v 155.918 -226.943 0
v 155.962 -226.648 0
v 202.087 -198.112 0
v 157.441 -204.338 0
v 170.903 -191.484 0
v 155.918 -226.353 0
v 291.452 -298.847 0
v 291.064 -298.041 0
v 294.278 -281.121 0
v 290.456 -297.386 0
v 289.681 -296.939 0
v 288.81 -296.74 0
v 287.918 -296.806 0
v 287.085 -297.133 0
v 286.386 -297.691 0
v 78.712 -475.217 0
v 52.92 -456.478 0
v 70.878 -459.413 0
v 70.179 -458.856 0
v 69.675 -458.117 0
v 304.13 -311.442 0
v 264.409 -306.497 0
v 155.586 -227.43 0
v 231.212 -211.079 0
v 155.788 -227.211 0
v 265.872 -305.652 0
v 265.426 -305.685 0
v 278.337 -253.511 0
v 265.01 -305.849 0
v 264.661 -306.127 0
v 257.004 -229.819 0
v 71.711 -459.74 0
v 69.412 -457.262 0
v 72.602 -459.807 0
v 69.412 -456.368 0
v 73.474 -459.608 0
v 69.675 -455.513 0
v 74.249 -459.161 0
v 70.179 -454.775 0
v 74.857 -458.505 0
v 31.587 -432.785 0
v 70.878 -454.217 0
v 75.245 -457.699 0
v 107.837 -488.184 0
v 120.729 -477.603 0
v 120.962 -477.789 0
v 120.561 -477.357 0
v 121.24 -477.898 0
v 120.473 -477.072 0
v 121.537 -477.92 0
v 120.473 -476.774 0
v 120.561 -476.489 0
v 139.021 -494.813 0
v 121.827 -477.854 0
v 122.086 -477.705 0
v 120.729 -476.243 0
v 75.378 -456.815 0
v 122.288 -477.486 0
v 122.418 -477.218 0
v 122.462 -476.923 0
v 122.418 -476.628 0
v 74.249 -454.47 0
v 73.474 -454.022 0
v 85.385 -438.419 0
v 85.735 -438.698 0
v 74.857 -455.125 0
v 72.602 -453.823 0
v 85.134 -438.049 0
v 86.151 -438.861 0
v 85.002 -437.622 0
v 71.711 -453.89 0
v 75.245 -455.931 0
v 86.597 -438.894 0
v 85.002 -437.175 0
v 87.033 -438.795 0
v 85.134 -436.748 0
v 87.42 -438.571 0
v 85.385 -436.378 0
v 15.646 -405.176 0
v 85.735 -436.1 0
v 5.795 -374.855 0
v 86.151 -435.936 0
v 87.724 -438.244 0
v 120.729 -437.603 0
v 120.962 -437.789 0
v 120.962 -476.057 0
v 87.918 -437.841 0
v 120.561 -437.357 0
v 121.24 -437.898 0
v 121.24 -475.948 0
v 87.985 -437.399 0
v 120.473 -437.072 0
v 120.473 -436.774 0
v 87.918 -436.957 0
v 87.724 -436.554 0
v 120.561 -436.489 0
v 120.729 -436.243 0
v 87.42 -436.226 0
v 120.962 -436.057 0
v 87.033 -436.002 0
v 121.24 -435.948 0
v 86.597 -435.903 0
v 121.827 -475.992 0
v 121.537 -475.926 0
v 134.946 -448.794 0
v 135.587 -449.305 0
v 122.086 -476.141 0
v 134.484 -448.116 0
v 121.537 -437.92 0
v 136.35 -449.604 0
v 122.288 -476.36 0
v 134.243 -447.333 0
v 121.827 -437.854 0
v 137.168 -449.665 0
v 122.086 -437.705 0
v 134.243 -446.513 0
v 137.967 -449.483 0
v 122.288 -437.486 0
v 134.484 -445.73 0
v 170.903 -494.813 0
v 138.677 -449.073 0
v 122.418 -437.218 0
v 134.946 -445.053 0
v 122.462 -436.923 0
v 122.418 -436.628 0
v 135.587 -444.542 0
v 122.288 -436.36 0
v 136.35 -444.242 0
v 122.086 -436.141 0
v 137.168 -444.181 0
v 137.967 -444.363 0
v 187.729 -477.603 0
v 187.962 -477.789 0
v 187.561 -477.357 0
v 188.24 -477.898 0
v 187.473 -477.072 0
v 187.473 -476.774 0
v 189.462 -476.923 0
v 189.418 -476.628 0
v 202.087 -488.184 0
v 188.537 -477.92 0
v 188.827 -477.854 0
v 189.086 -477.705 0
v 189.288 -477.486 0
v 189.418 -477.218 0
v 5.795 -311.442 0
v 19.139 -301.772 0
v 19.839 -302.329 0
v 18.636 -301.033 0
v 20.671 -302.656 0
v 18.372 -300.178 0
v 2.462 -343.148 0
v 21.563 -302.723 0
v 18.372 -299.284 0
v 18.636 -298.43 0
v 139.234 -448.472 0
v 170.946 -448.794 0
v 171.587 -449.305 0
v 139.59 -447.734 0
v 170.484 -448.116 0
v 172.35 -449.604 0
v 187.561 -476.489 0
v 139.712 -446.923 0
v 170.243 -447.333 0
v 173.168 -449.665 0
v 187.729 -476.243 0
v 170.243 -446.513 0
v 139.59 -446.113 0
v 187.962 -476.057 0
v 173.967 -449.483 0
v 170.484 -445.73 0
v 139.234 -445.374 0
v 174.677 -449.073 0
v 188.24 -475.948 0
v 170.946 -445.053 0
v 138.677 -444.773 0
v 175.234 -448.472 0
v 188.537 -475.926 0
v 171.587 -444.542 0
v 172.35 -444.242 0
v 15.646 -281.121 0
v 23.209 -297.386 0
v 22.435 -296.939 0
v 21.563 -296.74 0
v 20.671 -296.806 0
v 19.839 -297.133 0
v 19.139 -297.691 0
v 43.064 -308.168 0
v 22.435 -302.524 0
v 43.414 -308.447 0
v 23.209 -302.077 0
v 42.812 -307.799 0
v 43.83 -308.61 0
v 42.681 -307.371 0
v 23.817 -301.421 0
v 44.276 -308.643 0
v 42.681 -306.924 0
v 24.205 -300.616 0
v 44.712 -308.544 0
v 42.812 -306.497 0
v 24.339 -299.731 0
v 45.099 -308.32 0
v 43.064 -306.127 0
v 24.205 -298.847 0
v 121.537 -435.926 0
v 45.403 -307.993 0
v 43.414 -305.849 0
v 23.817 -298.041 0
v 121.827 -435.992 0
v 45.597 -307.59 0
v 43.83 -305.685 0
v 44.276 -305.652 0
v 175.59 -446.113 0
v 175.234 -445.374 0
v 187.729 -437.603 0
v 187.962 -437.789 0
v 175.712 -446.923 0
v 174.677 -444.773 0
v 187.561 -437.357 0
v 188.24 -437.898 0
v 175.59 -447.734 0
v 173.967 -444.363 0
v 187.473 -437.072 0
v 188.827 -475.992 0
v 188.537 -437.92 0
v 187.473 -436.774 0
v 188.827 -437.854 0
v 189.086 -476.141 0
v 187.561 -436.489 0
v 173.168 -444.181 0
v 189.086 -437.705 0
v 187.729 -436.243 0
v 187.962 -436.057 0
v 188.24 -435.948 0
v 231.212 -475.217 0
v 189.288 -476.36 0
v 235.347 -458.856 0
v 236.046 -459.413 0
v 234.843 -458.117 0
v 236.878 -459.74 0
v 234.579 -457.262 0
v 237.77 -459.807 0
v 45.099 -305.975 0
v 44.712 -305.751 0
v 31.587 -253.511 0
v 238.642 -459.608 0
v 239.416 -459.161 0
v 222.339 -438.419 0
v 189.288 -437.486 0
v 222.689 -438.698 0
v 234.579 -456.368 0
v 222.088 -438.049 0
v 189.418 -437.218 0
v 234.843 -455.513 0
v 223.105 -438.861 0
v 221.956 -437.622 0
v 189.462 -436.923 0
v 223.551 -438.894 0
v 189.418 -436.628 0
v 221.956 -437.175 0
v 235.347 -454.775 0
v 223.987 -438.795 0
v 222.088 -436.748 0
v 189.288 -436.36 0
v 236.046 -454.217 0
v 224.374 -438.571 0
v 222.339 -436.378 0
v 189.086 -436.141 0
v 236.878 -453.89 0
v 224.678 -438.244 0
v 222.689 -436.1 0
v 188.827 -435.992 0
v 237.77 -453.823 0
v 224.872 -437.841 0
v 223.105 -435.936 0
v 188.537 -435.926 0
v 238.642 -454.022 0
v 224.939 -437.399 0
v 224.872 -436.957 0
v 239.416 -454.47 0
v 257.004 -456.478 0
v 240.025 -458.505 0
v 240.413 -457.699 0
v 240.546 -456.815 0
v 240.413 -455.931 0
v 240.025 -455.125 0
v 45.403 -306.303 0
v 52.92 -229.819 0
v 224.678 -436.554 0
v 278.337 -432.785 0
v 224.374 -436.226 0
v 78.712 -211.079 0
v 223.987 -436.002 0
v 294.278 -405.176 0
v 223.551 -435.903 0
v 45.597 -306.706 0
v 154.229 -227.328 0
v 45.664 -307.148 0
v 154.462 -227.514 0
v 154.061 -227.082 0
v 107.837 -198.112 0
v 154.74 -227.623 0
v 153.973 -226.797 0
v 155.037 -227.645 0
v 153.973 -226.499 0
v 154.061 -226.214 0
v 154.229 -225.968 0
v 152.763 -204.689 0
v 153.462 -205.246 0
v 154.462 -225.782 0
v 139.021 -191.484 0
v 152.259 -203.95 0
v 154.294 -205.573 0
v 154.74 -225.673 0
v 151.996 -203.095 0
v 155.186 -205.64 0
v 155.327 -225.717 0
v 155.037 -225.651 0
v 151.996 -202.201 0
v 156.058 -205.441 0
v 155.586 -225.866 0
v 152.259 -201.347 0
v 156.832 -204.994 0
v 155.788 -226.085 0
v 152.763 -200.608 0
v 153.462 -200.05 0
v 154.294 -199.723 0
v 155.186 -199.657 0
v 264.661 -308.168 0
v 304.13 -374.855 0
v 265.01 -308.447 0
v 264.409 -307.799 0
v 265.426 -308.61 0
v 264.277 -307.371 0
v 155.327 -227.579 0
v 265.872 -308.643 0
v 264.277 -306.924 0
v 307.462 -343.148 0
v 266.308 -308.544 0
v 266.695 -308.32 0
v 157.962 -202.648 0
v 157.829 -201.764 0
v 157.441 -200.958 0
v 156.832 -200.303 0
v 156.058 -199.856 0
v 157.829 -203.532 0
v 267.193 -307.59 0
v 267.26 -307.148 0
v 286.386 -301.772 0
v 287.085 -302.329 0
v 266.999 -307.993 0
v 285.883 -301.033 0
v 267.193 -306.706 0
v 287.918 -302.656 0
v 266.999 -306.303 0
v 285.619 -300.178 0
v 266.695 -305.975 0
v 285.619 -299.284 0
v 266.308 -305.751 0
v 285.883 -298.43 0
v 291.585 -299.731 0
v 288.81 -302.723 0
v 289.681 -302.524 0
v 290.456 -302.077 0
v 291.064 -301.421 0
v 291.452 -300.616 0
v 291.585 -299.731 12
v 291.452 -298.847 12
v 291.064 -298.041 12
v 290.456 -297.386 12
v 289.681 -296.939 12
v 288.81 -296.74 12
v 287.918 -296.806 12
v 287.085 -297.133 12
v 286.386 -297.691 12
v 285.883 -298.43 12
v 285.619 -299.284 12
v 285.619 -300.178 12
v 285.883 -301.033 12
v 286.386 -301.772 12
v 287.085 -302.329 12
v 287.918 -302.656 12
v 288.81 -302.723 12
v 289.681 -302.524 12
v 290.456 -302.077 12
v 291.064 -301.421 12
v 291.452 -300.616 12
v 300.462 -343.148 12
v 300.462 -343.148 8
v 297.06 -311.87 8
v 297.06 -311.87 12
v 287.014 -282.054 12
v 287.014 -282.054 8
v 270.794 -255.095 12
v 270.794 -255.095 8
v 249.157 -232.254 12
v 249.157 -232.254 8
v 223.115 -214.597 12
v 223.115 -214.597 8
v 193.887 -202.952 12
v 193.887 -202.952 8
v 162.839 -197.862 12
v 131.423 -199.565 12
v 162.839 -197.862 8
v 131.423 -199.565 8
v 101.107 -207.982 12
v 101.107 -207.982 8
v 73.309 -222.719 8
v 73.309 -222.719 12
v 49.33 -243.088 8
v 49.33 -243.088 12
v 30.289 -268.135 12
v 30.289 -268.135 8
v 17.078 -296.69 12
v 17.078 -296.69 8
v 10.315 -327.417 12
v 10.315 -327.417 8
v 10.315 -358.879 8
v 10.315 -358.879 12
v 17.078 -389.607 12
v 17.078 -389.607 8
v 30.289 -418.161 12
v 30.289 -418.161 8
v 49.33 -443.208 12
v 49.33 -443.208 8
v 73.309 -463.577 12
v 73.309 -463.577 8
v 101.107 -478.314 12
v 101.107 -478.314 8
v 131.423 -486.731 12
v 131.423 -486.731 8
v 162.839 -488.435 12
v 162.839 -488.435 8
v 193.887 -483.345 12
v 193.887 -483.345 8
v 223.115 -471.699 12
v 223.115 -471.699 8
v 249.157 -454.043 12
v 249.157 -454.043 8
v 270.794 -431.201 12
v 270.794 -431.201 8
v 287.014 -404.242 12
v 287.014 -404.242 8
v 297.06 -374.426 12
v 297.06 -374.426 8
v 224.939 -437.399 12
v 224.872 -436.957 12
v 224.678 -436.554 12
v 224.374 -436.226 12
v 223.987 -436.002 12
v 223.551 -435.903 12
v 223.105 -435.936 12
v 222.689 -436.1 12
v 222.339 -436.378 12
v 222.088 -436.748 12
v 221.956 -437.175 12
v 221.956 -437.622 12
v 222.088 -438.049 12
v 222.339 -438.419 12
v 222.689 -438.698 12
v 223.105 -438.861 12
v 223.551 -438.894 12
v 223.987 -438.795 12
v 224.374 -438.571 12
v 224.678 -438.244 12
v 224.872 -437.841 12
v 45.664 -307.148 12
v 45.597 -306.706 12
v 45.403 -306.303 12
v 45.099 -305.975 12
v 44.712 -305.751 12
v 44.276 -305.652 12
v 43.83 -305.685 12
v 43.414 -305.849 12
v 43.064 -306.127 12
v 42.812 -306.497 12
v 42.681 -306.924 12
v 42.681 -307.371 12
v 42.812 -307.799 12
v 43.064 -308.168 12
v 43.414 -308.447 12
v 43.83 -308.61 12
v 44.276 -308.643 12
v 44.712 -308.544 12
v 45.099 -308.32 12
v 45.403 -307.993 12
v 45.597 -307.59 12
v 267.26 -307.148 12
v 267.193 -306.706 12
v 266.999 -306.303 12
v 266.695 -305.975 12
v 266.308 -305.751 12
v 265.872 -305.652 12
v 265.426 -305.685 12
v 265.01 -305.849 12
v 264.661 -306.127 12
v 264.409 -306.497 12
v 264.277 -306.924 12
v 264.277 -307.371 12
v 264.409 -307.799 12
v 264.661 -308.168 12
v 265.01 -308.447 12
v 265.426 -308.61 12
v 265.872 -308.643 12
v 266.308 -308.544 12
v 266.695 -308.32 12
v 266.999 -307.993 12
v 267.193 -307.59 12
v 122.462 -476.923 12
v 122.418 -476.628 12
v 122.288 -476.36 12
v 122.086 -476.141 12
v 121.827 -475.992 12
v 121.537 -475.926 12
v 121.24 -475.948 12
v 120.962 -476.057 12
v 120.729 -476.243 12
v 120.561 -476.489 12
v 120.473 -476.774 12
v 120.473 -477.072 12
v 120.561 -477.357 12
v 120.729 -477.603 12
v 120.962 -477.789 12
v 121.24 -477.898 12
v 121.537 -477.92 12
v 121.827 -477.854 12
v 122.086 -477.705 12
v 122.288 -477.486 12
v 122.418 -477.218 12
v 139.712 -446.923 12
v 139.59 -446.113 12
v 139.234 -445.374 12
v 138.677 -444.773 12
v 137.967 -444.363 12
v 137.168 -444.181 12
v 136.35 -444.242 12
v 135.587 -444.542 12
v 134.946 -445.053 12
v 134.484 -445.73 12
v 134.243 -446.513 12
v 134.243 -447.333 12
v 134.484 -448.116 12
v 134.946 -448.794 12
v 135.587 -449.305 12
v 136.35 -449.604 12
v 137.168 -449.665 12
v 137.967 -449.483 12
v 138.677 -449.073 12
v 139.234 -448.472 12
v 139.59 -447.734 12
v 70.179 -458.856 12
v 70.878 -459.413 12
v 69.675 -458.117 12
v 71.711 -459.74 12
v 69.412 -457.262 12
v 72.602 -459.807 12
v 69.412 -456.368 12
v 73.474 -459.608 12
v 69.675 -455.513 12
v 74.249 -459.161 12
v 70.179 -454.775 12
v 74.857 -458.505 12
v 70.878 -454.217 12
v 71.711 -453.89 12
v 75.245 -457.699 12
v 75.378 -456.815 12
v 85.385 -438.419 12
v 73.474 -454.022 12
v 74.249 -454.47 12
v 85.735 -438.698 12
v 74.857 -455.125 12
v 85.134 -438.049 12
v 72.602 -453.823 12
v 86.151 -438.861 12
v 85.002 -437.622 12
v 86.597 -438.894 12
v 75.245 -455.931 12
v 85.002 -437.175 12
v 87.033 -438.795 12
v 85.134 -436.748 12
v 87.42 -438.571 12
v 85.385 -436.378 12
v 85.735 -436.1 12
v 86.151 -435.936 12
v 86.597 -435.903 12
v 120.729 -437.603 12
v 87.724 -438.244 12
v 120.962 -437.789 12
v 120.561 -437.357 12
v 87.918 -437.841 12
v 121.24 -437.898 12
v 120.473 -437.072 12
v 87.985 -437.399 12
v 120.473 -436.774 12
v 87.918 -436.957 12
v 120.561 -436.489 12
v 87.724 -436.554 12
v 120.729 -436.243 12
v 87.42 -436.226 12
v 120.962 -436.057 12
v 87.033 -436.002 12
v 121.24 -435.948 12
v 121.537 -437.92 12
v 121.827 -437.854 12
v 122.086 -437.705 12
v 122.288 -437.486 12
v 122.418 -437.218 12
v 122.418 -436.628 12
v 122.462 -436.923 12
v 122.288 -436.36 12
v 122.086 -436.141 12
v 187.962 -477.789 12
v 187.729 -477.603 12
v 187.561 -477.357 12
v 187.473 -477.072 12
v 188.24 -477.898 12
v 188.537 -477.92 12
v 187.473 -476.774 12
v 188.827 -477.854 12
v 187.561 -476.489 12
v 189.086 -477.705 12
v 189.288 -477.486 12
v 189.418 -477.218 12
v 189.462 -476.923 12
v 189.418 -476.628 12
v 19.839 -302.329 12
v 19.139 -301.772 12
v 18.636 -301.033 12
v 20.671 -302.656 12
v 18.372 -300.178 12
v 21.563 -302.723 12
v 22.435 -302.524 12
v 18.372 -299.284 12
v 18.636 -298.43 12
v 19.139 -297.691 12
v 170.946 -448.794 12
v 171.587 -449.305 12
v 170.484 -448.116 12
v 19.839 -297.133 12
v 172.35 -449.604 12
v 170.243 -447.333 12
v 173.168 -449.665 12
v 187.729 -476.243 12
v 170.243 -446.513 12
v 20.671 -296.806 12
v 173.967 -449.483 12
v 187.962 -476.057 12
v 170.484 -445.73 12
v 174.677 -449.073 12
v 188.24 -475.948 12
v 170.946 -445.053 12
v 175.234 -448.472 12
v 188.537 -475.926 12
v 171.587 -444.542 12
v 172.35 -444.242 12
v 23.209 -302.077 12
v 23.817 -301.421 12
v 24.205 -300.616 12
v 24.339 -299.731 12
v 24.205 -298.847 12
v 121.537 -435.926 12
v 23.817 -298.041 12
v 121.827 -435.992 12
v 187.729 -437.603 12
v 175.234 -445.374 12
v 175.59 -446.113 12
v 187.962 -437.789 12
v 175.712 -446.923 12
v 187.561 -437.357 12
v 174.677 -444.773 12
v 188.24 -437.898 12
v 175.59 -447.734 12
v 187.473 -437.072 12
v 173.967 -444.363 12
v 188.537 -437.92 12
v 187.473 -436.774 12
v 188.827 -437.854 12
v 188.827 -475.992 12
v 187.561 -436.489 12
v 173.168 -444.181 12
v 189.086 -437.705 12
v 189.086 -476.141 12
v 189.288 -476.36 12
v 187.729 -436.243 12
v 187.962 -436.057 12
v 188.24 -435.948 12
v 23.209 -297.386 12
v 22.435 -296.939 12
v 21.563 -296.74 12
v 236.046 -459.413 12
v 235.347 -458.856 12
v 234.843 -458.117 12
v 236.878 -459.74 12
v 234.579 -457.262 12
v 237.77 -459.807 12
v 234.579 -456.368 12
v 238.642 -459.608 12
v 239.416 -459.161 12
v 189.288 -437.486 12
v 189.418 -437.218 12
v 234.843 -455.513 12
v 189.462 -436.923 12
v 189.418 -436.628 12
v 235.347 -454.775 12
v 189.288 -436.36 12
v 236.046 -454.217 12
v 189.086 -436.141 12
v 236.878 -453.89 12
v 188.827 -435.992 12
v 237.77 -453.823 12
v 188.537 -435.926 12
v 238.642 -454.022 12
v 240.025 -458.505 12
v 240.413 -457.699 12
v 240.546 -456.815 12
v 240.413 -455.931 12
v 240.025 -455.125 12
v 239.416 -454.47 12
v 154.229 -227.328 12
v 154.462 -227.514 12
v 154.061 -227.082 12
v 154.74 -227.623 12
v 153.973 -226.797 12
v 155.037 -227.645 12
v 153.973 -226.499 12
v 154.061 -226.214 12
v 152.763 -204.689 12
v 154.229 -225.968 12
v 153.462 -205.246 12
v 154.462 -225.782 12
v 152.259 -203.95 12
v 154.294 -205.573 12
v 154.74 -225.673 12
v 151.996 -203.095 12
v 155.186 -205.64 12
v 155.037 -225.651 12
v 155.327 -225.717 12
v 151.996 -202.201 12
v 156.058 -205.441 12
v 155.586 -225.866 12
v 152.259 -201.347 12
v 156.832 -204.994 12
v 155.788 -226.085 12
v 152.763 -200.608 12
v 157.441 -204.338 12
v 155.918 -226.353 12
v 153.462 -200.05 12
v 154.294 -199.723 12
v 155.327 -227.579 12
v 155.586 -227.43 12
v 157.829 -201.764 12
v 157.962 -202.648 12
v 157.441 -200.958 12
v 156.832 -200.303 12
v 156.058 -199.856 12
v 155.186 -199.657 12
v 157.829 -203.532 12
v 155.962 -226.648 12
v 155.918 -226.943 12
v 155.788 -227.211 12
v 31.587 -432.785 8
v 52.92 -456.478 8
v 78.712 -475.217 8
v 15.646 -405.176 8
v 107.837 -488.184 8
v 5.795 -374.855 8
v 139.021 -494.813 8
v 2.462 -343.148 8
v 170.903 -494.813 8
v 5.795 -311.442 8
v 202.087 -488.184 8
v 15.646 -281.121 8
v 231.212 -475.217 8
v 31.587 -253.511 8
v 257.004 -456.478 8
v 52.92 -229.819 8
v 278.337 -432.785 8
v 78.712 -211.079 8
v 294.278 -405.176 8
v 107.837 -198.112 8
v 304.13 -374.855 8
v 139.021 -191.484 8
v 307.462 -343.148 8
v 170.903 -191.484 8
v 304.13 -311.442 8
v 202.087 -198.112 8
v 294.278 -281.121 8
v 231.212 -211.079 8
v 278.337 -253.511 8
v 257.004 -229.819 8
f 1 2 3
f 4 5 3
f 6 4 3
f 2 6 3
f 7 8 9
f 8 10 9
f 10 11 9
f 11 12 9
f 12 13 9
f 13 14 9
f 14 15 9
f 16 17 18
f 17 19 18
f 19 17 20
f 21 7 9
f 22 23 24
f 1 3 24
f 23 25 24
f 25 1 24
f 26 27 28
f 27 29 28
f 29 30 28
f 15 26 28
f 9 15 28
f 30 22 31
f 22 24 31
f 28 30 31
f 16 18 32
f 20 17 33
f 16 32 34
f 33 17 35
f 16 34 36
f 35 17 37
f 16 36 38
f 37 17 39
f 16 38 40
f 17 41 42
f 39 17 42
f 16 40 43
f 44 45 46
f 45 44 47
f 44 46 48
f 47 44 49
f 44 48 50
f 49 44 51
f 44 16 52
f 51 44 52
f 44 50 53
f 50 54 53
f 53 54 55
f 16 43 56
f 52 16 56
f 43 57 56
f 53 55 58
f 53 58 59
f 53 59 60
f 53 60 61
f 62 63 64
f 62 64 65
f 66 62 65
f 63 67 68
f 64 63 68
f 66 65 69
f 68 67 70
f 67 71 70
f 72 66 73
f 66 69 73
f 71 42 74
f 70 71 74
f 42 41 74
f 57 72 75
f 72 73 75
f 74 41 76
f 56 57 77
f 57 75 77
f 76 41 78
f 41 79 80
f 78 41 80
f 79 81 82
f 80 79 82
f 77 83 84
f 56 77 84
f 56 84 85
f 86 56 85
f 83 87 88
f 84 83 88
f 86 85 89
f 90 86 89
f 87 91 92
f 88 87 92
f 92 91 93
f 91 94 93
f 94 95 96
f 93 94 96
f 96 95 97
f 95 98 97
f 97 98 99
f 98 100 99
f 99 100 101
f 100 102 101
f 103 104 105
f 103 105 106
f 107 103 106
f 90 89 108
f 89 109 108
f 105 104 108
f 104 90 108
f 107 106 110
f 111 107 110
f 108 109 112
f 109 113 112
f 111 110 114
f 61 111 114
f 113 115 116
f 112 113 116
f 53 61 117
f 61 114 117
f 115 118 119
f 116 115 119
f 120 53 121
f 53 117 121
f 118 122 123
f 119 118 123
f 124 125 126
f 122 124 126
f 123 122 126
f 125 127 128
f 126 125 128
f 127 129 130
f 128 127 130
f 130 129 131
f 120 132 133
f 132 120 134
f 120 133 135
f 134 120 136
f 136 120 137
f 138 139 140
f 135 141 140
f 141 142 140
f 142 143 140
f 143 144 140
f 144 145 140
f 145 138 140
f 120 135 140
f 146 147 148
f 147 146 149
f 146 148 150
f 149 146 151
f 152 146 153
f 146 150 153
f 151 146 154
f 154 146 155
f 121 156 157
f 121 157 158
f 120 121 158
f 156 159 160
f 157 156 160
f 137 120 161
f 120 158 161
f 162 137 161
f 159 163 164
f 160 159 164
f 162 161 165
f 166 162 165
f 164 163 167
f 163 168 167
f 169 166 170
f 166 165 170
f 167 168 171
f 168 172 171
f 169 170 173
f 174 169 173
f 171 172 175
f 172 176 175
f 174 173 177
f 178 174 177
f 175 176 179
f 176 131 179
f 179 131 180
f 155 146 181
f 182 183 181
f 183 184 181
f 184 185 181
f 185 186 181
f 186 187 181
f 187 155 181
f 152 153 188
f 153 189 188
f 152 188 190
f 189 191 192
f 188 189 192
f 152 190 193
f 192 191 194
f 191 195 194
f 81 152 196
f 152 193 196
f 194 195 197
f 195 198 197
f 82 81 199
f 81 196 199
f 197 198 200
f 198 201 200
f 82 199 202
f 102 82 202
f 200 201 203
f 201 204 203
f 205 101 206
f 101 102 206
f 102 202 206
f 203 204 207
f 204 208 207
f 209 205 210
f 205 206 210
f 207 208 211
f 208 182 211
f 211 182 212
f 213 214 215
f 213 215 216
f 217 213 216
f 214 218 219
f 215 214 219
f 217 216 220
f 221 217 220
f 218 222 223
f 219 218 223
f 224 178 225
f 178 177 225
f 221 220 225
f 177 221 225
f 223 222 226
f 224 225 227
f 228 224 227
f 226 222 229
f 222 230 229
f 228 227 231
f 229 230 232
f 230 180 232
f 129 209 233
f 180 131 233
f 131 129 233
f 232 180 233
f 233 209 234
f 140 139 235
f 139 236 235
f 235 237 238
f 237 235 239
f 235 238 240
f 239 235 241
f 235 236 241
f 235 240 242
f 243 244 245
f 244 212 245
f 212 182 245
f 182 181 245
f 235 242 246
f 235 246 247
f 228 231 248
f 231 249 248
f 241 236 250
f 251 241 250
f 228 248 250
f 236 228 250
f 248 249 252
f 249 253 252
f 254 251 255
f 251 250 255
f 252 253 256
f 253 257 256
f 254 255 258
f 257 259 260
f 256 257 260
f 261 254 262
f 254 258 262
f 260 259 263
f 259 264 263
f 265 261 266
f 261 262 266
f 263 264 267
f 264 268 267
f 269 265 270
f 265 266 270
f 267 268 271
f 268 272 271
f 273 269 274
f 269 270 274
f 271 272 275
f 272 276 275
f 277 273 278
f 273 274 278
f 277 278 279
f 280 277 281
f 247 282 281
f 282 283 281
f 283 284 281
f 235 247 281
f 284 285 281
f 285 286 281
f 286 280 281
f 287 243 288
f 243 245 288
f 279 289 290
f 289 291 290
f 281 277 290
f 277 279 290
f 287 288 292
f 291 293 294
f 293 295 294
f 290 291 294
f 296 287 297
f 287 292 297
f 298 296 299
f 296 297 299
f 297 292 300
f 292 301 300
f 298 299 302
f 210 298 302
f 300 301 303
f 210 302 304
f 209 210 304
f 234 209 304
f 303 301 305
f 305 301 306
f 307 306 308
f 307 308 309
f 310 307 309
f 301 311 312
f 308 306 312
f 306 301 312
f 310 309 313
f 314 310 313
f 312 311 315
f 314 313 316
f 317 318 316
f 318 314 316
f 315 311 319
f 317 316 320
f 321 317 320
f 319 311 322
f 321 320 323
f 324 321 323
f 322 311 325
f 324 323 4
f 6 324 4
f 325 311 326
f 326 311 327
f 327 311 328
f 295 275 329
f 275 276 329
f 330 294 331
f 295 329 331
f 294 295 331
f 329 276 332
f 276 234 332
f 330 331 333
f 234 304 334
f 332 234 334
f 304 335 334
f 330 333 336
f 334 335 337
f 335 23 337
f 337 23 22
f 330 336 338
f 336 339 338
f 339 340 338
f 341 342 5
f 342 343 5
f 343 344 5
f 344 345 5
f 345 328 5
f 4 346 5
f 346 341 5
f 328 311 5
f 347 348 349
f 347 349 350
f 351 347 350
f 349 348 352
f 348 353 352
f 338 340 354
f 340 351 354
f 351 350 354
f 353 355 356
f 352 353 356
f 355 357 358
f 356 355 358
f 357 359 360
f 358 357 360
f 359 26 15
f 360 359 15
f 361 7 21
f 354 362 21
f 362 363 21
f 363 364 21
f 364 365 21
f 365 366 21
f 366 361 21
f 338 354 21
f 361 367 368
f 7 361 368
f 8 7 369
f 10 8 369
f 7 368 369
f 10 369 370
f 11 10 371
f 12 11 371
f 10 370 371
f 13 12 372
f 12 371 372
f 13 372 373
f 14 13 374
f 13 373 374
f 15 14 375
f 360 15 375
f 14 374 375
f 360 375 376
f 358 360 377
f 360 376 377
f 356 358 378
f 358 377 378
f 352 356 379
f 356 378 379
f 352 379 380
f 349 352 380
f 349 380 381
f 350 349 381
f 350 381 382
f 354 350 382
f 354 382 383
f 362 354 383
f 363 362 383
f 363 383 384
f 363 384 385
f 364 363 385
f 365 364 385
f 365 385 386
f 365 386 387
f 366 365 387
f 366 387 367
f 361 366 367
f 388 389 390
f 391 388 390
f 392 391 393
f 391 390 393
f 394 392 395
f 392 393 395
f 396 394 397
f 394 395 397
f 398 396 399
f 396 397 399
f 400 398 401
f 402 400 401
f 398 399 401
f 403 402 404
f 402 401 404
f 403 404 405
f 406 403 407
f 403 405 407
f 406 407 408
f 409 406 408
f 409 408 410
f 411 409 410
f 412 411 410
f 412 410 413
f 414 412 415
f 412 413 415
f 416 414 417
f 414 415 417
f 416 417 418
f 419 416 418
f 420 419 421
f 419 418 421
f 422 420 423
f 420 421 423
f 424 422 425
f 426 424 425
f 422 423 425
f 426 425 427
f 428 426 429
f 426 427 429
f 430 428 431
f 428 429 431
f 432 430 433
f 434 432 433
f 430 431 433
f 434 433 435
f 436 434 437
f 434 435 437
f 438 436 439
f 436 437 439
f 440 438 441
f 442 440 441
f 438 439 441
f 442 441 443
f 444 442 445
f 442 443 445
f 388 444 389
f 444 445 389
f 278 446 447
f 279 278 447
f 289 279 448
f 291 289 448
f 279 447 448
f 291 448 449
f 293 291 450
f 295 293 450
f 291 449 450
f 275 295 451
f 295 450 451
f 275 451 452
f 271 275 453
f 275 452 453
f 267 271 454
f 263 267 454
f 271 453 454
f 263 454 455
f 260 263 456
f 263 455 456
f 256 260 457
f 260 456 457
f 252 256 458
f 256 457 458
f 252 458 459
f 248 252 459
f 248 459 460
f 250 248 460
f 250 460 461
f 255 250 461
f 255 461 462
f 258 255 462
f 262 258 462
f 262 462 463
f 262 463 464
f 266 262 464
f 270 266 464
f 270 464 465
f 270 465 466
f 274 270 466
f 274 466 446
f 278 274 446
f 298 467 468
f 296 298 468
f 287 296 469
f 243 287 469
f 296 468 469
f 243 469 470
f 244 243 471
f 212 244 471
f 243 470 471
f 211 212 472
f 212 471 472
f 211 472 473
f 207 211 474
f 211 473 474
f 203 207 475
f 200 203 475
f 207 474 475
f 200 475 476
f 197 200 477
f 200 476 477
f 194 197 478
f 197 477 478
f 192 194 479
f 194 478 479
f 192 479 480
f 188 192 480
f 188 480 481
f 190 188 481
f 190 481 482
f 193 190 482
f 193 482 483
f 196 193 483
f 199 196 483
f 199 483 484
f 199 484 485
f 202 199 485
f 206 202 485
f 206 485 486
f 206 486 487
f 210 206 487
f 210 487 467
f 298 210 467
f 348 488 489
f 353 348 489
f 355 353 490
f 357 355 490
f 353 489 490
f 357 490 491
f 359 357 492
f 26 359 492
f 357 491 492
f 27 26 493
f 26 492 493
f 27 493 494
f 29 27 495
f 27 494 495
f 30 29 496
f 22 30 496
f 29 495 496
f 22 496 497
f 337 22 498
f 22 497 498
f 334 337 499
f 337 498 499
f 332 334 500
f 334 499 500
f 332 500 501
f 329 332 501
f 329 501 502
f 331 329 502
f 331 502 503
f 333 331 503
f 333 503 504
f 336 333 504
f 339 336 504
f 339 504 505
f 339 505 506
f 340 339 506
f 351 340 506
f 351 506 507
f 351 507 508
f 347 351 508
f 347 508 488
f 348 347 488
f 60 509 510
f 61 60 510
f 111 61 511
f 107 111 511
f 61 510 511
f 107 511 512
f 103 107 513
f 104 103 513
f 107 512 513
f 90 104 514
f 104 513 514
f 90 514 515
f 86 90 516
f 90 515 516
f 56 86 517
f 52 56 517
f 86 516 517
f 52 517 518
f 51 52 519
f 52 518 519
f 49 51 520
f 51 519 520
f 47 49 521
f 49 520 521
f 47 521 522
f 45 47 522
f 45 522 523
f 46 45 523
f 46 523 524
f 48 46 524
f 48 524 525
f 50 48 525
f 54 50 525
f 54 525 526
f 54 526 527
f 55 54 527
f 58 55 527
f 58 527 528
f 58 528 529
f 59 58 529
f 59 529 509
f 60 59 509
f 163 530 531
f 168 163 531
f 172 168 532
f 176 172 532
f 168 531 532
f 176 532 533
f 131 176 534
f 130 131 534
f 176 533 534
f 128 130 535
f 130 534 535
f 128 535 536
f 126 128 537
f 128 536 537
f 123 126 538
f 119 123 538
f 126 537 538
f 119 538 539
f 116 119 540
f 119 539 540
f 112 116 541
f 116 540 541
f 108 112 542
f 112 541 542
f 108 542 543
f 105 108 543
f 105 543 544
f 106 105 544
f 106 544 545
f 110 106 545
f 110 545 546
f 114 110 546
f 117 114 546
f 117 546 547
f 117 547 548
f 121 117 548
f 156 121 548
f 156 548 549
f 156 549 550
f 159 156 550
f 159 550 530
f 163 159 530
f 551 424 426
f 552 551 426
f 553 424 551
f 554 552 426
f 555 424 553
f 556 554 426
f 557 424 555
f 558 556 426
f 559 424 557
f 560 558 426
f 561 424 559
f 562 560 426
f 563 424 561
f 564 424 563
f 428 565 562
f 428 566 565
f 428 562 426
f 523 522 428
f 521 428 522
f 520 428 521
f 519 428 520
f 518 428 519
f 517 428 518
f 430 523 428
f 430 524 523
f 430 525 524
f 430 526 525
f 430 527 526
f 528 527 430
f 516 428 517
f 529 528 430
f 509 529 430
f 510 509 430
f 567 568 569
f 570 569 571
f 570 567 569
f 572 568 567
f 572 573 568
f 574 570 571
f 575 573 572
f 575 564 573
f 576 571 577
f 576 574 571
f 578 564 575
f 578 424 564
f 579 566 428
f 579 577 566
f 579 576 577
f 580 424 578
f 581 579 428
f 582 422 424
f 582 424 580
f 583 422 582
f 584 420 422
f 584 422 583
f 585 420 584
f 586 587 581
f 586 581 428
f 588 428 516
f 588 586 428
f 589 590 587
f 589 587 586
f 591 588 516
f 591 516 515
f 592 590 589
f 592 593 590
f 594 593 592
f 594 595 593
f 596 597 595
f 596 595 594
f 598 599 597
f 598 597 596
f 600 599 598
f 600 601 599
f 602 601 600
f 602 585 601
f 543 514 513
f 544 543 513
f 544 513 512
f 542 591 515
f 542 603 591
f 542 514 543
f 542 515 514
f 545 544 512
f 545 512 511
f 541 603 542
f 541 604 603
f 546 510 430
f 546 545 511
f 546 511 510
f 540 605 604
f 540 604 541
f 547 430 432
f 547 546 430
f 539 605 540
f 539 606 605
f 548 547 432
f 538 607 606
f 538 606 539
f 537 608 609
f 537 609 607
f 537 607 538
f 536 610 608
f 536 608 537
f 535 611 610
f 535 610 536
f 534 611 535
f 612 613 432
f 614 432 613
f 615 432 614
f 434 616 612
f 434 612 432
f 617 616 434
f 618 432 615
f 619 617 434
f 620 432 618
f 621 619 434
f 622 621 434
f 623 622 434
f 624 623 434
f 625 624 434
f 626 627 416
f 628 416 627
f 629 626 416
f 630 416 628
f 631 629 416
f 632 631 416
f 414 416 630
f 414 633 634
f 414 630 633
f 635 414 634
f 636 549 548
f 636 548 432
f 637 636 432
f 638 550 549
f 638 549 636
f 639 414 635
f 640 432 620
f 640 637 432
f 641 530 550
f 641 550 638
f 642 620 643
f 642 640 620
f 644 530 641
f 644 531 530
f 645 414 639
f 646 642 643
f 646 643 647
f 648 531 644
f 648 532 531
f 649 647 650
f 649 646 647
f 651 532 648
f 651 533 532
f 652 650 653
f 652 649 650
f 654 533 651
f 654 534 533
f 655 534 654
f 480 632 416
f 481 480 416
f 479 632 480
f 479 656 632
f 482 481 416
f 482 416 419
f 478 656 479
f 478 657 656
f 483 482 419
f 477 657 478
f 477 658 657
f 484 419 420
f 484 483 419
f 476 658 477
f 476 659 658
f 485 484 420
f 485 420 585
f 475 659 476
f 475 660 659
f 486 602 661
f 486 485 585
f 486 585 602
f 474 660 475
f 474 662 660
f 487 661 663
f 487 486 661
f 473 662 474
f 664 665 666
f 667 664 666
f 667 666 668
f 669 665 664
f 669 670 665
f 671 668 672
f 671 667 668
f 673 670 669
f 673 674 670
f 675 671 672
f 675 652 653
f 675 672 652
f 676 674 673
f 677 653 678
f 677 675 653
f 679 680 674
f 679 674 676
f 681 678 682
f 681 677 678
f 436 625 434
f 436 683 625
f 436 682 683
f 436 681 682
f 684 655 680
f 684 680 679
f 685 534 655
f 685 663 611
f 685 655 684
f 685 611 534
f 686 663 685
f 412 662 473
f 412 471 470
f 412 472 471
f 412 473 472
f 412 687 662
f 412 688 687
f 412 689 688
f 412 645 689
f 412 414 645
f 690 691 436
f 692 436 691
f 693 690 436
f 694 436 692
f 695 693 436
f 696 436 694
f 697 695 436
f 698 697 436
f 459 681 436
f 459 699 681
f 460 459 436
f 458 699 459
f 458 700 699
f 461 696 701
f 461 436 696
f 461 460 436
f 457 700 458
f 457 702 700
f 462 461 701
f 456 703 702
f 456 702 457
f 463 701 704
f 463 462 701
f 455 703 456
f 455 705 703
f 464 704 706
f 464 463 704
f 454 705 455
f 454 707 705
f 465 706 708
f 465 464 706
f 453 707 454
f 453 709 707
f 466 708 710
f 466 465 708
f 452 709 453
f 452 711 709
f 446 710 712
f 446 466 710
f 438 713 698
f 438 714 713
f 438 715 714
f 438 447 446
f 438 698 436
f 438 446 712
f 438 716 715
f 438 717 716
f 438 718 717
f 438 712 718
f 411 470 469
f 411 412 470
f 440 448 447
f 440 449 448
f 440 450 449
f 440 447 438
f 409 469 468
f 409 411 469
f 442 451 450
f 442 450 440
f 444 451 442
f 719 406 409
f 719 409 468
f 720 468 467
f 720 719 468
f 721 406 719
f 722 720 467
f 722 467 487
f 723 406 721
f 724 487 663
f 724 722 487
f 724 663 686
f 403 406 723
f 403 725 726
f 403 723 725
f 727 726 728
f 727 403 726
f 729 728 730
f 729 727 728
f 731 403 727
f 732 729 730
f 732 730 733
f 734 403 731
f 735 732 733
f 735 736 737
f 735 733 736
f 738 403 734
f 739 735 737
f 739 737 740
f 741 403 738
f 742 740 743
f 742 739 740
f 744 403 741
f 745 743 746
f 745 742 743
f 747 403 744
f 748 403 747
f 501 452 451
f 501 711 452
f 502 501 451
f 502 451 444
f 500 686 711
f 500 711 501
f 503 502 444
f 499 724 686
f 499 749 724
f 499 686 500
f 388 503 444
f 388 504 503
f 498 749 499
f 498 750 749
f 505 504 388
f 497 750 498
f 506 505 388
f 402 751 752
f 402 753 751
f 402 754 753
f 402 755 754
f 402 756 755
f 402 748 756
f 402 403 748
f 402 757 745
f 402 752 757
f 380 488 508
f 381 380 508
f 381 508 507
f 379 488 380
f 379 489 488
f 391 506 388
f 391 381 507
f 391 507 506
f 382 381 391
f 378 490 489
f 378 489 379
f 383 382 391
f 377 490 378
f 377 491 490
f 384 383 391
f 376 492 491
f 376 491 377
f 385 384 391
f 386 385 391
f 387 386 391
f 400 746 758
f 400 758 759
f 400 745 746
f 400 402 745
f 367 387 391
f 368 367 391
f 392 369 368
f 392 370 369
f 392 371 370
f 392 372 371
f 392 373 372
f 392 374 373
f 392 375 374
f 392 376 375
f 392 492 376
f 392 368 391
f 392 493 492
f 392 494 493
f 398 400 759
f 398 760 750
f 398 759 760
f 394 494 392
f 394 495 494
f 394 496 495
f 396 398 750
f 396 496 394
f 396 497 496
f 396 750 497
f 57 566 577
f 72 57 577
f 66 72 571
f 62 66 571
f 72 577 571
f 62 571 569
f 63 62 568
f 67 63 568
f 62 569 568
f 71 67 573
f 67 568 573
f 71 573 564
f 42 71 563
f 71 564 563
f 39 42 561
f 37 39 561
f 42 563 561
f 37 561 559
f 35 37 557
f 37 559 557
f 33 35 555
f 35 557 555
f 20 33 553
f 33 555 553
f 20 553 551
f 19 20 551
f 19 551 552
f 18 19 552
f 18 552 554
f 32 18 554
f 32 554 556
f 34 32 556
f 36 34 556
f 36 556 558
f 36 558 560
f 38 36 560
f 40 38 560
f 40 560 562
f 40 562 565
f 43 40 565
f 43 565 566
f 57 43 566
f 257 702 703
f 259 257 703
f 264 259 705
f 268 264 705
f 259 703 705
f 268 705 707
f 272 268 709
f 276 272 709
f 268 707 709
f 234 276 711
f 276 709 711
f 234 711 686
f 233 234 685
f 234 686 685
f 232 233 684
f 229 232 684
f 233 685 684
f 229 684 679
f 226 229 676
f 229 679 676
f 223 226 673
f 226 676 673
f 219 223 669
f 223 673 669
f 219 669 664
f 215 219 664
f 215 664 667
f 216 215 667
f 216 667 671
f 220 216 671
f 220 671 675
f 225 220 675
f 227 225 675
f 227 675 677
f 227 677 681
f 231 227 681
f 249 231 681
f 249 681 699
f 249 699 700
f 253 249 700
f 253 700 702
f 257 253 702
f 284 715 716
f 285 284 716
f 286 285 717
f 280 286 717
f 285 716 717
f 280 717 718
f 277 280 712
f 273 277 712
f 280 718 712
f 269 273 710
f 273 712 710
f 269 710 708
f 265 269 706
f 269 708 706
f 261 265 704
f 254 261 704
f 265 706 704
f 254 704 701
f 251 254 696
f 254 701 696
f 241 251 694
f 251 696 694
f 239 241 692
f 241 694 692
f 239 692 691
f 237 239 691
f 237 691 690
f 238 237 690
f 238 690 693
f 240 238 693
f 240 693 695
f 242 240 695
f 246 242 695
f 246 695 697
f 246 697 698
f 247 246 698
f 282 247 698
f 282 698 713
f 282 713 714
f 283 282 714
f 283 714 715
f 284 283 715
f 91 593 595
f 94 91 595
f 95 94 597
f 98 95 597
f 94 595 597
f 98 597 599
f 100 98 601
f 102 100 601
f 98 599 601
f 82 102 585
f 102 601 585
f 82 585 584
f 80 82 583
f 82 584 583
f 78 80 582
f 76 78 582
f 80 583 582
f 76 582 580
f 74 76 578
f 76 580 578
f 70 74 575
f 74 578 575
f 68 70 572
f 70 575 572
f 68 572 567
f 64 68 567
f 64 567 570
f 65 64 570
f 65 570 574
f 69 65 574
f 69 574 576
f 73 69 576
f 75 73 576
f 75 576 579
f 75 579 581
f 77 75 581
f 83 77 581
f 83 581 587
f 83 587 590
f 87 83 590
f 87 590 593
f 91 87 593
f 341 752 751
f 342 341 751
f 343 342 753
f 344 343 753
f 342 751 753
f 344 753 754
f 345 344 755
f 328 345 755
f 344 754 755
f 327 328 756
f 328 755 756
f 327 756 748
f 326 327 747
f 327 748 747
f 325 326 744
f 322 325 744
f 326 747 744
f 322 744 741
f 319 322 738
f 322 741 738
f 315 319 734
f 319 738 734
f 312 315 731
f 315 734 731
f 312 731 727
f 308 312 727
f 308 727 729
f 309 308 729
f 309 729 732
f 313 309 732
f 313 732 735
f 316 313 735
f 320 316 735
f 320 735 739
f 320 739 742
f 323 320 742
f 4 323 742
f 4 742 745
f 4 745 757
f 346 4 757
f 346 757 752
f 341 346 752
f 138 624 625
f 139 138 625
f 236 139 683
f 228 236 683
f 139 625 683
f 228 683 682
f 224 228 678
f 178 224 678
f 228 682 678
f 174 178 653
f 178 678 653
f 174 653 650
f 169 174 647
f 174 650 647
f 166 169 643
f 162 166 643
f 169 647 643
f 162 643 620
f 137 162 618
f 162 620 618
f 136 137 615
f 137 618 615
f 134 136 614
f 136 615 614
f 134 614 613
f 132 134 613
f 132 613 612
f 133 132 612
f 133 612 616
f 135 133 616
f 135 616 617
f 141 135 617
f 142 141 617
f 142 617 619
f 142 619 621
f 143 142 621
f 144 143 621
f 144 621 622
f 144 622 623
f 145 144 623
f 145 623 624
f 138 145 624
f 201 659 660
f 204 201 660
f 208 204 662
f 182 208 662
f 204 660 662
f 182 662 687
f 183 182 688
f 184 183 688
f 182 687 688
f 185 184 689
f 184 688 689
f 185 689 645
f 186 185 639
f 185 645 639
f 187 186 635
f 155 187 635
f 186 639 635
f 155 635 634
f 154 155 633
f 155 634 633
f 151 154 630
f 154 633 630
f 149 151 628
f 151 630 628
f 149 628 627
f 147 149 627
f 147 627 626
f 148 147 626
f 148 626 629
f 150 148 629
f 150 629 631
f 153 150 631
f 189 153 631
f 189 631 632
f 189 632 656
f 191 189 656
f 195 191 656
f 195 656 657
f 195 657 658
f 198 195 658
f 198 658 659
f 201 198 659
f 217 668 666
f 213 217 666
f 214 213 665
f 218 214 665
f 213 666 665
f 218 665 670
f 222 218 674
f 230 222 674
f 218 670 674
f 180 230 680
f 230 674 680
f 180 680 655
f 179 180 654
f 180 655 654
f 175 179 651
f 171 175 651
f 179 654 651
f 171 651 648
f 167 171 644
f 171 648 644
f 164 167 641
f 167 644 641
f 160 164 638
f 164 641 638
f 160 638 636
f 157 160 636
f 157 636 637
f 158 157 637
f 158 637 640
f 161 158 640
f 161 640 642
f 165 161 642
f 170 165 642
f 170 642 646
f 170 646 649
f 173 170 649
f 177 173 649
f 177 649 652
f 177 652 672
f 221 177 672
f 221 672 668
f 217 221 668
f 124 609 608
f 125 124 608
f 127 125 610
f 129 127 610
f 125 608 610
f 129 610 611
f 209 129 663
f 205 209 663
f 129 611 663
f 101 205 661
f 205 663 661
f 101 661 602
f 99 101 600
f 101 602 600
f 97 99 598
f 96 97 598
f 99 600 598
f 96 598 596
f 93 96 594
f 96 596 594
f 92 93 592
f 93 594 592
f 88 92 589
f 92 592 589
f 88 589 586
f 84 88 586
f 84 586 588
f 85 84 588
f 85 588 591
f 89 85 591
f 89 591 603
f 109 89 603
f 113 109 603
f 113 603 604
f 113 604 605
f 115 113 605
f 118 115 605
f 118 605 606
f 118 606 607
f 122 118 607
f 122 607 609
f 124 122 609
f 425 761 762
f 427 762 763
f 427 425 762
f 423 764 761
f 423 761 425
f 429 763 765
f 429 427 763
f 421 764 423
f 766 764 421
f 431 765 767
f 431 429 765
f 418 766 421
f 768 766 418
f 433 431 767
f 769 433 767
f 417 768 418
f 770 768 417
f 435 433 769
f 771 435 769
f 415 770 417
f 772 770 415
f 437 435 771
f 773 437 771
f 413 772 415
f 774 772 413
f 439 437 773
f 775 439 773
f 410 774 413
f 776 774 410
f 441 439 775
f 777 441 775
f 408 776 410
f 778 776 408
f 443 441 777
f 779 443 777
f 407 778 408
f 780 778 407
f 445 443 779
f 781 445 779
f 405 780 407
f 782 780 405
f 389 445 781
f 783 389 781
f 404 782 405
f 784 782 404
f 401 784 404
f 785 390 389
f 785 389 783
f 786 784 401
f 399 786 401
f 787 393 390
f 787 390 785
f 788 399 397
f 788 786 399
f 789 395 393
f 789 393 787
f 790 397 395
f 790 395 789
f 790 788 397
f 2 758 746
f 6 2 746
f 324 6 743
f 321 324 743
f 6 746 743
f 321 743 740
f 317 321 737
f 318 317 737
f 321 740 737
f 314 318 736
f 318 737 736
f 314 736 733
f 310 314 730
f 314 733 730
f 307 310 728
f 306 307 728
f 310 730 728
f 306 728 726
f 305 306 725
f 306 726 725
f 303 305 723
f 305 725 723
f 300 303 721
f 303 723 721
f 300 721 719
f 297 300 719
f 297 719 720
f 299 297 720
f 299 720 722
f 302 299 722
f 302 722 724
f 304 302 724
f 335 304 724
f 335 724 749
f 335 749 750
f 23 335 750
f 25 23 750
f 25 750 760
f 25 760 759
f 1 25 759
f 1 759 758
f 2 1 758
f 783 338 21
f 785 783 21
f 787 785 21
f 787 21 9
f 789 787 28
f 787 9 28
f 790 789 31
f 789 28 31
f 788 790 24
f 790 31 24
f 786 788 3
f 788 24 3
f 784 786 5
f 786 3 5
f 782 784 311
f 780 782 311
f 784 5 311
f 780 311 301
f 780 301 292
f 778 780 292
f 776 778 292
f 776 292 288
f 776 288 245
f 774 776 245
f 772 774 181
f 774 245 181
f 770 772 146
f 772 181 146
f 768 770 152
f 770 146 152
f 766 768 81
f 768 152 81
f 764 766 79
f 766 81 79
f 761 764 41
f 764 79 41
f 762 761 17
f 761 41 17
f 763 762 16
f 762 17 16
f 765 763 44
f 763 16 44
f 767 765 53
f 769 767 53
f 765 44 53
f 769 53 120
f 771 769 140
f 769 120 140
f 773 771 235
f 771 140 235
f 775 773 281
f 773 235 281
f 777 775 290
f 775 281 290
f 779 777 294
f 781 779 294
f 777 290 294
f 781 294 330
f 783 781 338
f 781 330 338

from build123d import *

# Parameters (mm, degrees)
SKETCH025_R     = 152.5
PAD015_DEPTH    = 8
SKETCH057_R     = 145.5
PAD016_DEPTH    = 4
SKETCH052_R     = 3
SKETCH052_R_2   = 1.5
SKETCH052_R_3   = 1
SKETCH052_R_4   = 2.75
POCKET018_DEPTH = 12.001


with BuildPart() as part:
    # Sketch025 → Pad015 (new body)
    with BuildSketch(Plane.XY):
        with Locations((0.142028, -323.737579)):
            Circle(SKETCH025_R)
    extrude(amount=PAD015_DEPTH)

    # Sketch057 (on DatumPlane) → Pad016 (join)
    with BuildSketch(Plane.XY.offset(8)):
        with Locations((0.142028, -323.737579)):
            Circle(SKETCH057_R)
    extrude(amount=PAD016_DEPTH)

    # Sketch052 → Pocket018 (cut, through all)
    with BuildSketch(Plane.XY.offset(12)):
        with Locations((0.142028, -183.237579)):
            Circle(SKETCH052_R)
        with Locations((133.765469, -280.320691)):
            Circle(SKETCH052_R)
        with Locations((110.940112, -287.737099)):
            Circle(SKETCH052_R_2)
        with Locations((-133.481413, -280.320691)):
            Circle(SKETCH052_R)
        with Locations((-110.656056, -287.737099)):
            Circle(SKETCH052_R_2)
        with Locations((-82.4418, -437.404467)):
            Circle(SKETCH052_R)
        with Locations((-68.334954, -417.988059)):
            Circle(SKETCH052_R_2)
        with Locations((82.725856, -437.404467)):
            Circle(SKETCH052_R)
        with Locations((68.61901, -417.988059)):
            Circle(SKETCH052_R_2)
        with Locations((-33.357972, -417.512577)):
            Circle(SKETCH052_R_3)
        with Locations((-33.357972, -457.512577)):
            Circle(SKETCH052_R_3)
        with Locations((33.642028, -457.512577)):
            Circle(SKETCH052_R_3)
        with Locations((33.642028, -417.512577)):
            Circle(SKETCH052_R_3)
        with Locations((0.142028, -207.237579)):
            Circle(SKETCH052_R_3)
        with Locations((-17.857972, -427.512577)):
            Circle(SKETCH052_R_4)
        with Locations((18.142028, -427.512577)):
            Circle(SKETCH052_R_4)
    extrude(amount=-POCKET018_DEPTH, mode=Mode.SUBTRACT)


with BuildPart() as part_1:
    # Body005 placement: moved
    add(part.part.moved(Location((154.819995, -19.410585, 0))))


solid = part_1.part
